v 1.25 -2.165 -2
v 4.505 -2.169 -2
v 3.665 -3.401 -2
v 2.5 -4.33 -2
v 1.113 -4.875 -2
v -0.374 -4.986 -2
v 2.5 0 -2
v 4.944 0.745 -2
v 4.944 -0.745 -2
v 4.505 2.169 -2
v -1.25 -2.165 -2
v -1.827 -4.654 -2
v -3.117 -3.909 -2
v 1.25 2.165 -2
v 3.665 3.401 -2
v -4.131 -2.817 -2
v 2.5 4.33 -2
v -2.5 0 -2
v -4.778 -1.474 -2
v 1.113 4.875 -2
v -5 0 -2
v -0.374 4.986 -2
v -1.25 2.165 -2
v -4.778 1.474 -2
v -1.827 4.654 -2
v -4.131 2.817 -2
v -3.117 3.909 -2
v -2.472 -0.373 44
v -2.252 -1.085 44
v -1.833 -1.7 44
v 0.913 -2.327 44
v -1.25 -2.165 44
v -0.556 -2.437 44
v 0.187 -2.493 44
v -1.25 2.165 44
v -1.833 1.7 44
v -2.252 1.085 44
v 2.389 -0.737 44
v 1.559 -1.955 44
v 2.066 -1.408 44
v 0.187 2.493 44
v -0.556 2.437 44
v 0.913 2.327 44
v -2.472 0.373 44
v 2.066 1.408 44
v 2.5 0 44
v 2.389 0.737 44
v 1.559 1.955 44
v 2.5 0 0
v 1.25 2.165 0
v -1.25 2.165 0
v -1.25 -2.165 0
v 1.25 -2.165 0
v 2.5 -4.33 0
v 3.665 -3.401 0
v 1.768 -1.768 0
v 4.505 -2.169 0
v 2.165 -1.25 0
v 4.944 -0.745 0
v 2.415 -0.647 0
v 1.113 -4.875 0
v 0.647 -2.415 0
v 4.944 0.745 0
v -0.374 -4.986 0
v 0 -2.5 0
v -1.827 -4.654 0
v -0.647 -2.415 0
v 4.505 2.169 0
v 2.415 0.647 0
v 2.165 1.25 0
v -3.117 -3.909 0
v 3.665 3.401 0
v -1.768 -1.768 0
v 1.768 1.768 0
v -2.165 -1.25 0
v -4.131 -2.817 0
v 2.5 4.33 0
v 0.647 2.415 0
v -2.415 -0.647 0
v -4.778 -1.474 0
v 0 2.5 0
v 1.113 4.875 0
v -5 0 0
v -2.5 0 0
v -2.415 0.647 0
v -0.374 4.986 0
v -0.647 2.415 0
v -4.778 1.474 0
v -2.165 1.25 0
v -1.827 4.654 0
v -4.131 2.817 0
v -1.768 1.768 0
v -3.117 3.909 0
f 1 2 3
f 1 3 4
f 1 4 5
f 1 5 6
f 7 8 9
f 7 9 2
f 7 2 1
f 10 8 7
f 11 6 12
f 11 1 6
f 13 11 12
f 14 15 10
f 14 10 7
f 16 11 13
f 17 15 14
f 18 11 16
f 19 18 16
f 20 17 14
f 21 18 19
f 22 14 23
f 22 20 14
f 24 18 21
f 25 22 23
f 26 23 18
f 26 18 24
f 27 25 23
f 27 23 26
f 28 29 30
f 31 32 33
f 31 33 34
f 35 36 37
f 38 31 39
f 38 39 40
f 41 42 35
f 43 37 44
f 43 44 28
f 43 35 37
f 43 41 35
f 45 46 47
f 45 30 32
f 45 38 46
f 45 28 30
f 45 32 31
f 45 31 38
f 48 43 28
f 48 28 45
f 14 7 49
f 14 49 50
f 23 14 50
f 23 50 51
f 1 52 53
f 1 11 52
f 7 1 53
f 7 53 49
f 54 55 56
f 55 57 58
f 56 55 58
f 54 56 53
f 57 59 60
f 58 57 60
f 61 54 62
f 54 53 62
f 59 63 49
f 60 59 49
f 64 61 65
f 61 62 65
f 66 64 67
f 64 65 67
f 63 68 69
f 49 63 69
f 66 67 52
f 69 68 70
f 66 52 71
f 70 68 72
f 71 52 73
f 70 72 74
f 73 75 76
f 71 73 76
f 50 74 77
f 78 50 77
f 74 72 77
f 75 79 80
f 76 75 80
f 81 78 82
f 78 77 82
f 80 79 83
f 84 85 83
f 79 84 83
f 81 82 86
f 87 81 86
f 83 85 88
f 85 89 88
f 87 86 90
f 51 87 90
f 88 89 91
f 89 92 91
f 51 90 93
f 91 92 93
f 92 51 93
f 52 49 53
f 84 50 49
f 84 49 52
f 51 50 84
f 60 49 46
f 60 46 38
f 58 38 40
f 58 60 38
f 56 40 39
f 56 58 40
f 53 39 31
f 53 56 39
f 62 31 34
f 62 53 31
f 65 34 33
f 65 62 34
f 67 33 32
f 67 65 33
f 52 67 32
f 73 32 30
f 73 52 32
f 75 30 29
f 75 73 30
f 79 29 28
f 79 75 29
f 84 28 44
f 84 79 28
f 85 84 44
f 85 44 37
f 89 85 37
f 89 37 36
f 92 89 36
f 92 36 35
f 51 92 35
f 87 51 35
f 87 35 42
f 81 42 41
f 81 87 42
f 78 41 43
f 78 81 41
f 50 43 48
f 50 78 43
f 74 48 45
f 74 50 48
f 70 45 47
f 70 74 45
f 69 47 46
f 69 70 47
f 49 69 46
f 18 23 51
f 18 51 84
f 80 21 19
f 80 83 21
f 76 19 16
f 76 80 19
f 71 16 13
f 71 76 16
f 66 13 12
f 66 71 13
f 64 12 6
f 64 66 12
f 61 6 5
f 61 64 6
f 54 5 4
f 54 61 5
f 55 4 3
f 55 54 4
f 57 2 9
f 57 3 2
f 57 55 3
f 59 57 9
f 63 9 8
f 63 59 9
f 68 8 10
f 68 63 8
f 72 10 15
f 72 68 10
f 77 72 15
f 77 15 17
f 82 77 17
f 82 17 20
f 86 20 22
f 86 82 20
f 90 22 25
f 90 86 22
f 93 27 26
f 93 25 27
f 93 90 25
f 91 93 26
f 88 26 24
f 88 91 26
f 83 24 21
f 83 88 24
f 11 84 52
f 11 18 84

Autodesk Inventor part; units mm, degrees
ref_plane "YZ Plane" through (0, 0, 0) normal (1, 0, 0) x (0, 1, 0)
ref_plane "XZ Plane" through (0, 0, 0) normal (0, 1, 0) x (-1, 0, 0)
ref_plane "XY Plane" through (0, 0, 0) normal (0, 0, 1) x (1, 0, 0)
sketch "草图1" plane through (0, 0, 0) normal (0, 0, 1) x (1, 0, 0)
  circle A0 centre (0, 0) radius 2.5
  dimension "d0" = 5
extrude "拉伸1" add sketch "草图1" along normal blind 44
sketch "草图2" plane through (0, 0, 0) normal (0, 0, -1) x (-1, 0, 0)
  circle A0 centre (0, 0) radius 5
  dimension "d3" = 10
extrude "拉伸2" add sketch "草图2" along normal blind 2
sketch "草图3" plane through (0, 0, -2) normal (0, 0, -1) x (-1, 0, 0)
  circle A0 centre (0, 0) radius 2.5 projected
  line L0 (2.5, 0) -> (1.25, -2.1651)
  line L1 (1.25, -2.1651) -> (-1.25, -2.1651)
  line L2 (-1.25, -2.1651) -> (-2.5, 0)
  line L3 (-2.5, 0) -> (-1.25, 2.1651)
  line L4 (-1.25, 2.1651) -> (1.25, 2.1651)
  line L5 (1.25, 2.1651) -> (2.5, 0)
  dimension "d6" = 4.3301
extrude "拉伸3" cut sketch "草图3" against normal blind 2 contours L0 L1 L2 L3 L4 L5
thread "螺纹1" size "M5x0.8" class "6g" standard "ANSI Metric M Profile" full length
properties part number "Hex Screws used in Desk"
